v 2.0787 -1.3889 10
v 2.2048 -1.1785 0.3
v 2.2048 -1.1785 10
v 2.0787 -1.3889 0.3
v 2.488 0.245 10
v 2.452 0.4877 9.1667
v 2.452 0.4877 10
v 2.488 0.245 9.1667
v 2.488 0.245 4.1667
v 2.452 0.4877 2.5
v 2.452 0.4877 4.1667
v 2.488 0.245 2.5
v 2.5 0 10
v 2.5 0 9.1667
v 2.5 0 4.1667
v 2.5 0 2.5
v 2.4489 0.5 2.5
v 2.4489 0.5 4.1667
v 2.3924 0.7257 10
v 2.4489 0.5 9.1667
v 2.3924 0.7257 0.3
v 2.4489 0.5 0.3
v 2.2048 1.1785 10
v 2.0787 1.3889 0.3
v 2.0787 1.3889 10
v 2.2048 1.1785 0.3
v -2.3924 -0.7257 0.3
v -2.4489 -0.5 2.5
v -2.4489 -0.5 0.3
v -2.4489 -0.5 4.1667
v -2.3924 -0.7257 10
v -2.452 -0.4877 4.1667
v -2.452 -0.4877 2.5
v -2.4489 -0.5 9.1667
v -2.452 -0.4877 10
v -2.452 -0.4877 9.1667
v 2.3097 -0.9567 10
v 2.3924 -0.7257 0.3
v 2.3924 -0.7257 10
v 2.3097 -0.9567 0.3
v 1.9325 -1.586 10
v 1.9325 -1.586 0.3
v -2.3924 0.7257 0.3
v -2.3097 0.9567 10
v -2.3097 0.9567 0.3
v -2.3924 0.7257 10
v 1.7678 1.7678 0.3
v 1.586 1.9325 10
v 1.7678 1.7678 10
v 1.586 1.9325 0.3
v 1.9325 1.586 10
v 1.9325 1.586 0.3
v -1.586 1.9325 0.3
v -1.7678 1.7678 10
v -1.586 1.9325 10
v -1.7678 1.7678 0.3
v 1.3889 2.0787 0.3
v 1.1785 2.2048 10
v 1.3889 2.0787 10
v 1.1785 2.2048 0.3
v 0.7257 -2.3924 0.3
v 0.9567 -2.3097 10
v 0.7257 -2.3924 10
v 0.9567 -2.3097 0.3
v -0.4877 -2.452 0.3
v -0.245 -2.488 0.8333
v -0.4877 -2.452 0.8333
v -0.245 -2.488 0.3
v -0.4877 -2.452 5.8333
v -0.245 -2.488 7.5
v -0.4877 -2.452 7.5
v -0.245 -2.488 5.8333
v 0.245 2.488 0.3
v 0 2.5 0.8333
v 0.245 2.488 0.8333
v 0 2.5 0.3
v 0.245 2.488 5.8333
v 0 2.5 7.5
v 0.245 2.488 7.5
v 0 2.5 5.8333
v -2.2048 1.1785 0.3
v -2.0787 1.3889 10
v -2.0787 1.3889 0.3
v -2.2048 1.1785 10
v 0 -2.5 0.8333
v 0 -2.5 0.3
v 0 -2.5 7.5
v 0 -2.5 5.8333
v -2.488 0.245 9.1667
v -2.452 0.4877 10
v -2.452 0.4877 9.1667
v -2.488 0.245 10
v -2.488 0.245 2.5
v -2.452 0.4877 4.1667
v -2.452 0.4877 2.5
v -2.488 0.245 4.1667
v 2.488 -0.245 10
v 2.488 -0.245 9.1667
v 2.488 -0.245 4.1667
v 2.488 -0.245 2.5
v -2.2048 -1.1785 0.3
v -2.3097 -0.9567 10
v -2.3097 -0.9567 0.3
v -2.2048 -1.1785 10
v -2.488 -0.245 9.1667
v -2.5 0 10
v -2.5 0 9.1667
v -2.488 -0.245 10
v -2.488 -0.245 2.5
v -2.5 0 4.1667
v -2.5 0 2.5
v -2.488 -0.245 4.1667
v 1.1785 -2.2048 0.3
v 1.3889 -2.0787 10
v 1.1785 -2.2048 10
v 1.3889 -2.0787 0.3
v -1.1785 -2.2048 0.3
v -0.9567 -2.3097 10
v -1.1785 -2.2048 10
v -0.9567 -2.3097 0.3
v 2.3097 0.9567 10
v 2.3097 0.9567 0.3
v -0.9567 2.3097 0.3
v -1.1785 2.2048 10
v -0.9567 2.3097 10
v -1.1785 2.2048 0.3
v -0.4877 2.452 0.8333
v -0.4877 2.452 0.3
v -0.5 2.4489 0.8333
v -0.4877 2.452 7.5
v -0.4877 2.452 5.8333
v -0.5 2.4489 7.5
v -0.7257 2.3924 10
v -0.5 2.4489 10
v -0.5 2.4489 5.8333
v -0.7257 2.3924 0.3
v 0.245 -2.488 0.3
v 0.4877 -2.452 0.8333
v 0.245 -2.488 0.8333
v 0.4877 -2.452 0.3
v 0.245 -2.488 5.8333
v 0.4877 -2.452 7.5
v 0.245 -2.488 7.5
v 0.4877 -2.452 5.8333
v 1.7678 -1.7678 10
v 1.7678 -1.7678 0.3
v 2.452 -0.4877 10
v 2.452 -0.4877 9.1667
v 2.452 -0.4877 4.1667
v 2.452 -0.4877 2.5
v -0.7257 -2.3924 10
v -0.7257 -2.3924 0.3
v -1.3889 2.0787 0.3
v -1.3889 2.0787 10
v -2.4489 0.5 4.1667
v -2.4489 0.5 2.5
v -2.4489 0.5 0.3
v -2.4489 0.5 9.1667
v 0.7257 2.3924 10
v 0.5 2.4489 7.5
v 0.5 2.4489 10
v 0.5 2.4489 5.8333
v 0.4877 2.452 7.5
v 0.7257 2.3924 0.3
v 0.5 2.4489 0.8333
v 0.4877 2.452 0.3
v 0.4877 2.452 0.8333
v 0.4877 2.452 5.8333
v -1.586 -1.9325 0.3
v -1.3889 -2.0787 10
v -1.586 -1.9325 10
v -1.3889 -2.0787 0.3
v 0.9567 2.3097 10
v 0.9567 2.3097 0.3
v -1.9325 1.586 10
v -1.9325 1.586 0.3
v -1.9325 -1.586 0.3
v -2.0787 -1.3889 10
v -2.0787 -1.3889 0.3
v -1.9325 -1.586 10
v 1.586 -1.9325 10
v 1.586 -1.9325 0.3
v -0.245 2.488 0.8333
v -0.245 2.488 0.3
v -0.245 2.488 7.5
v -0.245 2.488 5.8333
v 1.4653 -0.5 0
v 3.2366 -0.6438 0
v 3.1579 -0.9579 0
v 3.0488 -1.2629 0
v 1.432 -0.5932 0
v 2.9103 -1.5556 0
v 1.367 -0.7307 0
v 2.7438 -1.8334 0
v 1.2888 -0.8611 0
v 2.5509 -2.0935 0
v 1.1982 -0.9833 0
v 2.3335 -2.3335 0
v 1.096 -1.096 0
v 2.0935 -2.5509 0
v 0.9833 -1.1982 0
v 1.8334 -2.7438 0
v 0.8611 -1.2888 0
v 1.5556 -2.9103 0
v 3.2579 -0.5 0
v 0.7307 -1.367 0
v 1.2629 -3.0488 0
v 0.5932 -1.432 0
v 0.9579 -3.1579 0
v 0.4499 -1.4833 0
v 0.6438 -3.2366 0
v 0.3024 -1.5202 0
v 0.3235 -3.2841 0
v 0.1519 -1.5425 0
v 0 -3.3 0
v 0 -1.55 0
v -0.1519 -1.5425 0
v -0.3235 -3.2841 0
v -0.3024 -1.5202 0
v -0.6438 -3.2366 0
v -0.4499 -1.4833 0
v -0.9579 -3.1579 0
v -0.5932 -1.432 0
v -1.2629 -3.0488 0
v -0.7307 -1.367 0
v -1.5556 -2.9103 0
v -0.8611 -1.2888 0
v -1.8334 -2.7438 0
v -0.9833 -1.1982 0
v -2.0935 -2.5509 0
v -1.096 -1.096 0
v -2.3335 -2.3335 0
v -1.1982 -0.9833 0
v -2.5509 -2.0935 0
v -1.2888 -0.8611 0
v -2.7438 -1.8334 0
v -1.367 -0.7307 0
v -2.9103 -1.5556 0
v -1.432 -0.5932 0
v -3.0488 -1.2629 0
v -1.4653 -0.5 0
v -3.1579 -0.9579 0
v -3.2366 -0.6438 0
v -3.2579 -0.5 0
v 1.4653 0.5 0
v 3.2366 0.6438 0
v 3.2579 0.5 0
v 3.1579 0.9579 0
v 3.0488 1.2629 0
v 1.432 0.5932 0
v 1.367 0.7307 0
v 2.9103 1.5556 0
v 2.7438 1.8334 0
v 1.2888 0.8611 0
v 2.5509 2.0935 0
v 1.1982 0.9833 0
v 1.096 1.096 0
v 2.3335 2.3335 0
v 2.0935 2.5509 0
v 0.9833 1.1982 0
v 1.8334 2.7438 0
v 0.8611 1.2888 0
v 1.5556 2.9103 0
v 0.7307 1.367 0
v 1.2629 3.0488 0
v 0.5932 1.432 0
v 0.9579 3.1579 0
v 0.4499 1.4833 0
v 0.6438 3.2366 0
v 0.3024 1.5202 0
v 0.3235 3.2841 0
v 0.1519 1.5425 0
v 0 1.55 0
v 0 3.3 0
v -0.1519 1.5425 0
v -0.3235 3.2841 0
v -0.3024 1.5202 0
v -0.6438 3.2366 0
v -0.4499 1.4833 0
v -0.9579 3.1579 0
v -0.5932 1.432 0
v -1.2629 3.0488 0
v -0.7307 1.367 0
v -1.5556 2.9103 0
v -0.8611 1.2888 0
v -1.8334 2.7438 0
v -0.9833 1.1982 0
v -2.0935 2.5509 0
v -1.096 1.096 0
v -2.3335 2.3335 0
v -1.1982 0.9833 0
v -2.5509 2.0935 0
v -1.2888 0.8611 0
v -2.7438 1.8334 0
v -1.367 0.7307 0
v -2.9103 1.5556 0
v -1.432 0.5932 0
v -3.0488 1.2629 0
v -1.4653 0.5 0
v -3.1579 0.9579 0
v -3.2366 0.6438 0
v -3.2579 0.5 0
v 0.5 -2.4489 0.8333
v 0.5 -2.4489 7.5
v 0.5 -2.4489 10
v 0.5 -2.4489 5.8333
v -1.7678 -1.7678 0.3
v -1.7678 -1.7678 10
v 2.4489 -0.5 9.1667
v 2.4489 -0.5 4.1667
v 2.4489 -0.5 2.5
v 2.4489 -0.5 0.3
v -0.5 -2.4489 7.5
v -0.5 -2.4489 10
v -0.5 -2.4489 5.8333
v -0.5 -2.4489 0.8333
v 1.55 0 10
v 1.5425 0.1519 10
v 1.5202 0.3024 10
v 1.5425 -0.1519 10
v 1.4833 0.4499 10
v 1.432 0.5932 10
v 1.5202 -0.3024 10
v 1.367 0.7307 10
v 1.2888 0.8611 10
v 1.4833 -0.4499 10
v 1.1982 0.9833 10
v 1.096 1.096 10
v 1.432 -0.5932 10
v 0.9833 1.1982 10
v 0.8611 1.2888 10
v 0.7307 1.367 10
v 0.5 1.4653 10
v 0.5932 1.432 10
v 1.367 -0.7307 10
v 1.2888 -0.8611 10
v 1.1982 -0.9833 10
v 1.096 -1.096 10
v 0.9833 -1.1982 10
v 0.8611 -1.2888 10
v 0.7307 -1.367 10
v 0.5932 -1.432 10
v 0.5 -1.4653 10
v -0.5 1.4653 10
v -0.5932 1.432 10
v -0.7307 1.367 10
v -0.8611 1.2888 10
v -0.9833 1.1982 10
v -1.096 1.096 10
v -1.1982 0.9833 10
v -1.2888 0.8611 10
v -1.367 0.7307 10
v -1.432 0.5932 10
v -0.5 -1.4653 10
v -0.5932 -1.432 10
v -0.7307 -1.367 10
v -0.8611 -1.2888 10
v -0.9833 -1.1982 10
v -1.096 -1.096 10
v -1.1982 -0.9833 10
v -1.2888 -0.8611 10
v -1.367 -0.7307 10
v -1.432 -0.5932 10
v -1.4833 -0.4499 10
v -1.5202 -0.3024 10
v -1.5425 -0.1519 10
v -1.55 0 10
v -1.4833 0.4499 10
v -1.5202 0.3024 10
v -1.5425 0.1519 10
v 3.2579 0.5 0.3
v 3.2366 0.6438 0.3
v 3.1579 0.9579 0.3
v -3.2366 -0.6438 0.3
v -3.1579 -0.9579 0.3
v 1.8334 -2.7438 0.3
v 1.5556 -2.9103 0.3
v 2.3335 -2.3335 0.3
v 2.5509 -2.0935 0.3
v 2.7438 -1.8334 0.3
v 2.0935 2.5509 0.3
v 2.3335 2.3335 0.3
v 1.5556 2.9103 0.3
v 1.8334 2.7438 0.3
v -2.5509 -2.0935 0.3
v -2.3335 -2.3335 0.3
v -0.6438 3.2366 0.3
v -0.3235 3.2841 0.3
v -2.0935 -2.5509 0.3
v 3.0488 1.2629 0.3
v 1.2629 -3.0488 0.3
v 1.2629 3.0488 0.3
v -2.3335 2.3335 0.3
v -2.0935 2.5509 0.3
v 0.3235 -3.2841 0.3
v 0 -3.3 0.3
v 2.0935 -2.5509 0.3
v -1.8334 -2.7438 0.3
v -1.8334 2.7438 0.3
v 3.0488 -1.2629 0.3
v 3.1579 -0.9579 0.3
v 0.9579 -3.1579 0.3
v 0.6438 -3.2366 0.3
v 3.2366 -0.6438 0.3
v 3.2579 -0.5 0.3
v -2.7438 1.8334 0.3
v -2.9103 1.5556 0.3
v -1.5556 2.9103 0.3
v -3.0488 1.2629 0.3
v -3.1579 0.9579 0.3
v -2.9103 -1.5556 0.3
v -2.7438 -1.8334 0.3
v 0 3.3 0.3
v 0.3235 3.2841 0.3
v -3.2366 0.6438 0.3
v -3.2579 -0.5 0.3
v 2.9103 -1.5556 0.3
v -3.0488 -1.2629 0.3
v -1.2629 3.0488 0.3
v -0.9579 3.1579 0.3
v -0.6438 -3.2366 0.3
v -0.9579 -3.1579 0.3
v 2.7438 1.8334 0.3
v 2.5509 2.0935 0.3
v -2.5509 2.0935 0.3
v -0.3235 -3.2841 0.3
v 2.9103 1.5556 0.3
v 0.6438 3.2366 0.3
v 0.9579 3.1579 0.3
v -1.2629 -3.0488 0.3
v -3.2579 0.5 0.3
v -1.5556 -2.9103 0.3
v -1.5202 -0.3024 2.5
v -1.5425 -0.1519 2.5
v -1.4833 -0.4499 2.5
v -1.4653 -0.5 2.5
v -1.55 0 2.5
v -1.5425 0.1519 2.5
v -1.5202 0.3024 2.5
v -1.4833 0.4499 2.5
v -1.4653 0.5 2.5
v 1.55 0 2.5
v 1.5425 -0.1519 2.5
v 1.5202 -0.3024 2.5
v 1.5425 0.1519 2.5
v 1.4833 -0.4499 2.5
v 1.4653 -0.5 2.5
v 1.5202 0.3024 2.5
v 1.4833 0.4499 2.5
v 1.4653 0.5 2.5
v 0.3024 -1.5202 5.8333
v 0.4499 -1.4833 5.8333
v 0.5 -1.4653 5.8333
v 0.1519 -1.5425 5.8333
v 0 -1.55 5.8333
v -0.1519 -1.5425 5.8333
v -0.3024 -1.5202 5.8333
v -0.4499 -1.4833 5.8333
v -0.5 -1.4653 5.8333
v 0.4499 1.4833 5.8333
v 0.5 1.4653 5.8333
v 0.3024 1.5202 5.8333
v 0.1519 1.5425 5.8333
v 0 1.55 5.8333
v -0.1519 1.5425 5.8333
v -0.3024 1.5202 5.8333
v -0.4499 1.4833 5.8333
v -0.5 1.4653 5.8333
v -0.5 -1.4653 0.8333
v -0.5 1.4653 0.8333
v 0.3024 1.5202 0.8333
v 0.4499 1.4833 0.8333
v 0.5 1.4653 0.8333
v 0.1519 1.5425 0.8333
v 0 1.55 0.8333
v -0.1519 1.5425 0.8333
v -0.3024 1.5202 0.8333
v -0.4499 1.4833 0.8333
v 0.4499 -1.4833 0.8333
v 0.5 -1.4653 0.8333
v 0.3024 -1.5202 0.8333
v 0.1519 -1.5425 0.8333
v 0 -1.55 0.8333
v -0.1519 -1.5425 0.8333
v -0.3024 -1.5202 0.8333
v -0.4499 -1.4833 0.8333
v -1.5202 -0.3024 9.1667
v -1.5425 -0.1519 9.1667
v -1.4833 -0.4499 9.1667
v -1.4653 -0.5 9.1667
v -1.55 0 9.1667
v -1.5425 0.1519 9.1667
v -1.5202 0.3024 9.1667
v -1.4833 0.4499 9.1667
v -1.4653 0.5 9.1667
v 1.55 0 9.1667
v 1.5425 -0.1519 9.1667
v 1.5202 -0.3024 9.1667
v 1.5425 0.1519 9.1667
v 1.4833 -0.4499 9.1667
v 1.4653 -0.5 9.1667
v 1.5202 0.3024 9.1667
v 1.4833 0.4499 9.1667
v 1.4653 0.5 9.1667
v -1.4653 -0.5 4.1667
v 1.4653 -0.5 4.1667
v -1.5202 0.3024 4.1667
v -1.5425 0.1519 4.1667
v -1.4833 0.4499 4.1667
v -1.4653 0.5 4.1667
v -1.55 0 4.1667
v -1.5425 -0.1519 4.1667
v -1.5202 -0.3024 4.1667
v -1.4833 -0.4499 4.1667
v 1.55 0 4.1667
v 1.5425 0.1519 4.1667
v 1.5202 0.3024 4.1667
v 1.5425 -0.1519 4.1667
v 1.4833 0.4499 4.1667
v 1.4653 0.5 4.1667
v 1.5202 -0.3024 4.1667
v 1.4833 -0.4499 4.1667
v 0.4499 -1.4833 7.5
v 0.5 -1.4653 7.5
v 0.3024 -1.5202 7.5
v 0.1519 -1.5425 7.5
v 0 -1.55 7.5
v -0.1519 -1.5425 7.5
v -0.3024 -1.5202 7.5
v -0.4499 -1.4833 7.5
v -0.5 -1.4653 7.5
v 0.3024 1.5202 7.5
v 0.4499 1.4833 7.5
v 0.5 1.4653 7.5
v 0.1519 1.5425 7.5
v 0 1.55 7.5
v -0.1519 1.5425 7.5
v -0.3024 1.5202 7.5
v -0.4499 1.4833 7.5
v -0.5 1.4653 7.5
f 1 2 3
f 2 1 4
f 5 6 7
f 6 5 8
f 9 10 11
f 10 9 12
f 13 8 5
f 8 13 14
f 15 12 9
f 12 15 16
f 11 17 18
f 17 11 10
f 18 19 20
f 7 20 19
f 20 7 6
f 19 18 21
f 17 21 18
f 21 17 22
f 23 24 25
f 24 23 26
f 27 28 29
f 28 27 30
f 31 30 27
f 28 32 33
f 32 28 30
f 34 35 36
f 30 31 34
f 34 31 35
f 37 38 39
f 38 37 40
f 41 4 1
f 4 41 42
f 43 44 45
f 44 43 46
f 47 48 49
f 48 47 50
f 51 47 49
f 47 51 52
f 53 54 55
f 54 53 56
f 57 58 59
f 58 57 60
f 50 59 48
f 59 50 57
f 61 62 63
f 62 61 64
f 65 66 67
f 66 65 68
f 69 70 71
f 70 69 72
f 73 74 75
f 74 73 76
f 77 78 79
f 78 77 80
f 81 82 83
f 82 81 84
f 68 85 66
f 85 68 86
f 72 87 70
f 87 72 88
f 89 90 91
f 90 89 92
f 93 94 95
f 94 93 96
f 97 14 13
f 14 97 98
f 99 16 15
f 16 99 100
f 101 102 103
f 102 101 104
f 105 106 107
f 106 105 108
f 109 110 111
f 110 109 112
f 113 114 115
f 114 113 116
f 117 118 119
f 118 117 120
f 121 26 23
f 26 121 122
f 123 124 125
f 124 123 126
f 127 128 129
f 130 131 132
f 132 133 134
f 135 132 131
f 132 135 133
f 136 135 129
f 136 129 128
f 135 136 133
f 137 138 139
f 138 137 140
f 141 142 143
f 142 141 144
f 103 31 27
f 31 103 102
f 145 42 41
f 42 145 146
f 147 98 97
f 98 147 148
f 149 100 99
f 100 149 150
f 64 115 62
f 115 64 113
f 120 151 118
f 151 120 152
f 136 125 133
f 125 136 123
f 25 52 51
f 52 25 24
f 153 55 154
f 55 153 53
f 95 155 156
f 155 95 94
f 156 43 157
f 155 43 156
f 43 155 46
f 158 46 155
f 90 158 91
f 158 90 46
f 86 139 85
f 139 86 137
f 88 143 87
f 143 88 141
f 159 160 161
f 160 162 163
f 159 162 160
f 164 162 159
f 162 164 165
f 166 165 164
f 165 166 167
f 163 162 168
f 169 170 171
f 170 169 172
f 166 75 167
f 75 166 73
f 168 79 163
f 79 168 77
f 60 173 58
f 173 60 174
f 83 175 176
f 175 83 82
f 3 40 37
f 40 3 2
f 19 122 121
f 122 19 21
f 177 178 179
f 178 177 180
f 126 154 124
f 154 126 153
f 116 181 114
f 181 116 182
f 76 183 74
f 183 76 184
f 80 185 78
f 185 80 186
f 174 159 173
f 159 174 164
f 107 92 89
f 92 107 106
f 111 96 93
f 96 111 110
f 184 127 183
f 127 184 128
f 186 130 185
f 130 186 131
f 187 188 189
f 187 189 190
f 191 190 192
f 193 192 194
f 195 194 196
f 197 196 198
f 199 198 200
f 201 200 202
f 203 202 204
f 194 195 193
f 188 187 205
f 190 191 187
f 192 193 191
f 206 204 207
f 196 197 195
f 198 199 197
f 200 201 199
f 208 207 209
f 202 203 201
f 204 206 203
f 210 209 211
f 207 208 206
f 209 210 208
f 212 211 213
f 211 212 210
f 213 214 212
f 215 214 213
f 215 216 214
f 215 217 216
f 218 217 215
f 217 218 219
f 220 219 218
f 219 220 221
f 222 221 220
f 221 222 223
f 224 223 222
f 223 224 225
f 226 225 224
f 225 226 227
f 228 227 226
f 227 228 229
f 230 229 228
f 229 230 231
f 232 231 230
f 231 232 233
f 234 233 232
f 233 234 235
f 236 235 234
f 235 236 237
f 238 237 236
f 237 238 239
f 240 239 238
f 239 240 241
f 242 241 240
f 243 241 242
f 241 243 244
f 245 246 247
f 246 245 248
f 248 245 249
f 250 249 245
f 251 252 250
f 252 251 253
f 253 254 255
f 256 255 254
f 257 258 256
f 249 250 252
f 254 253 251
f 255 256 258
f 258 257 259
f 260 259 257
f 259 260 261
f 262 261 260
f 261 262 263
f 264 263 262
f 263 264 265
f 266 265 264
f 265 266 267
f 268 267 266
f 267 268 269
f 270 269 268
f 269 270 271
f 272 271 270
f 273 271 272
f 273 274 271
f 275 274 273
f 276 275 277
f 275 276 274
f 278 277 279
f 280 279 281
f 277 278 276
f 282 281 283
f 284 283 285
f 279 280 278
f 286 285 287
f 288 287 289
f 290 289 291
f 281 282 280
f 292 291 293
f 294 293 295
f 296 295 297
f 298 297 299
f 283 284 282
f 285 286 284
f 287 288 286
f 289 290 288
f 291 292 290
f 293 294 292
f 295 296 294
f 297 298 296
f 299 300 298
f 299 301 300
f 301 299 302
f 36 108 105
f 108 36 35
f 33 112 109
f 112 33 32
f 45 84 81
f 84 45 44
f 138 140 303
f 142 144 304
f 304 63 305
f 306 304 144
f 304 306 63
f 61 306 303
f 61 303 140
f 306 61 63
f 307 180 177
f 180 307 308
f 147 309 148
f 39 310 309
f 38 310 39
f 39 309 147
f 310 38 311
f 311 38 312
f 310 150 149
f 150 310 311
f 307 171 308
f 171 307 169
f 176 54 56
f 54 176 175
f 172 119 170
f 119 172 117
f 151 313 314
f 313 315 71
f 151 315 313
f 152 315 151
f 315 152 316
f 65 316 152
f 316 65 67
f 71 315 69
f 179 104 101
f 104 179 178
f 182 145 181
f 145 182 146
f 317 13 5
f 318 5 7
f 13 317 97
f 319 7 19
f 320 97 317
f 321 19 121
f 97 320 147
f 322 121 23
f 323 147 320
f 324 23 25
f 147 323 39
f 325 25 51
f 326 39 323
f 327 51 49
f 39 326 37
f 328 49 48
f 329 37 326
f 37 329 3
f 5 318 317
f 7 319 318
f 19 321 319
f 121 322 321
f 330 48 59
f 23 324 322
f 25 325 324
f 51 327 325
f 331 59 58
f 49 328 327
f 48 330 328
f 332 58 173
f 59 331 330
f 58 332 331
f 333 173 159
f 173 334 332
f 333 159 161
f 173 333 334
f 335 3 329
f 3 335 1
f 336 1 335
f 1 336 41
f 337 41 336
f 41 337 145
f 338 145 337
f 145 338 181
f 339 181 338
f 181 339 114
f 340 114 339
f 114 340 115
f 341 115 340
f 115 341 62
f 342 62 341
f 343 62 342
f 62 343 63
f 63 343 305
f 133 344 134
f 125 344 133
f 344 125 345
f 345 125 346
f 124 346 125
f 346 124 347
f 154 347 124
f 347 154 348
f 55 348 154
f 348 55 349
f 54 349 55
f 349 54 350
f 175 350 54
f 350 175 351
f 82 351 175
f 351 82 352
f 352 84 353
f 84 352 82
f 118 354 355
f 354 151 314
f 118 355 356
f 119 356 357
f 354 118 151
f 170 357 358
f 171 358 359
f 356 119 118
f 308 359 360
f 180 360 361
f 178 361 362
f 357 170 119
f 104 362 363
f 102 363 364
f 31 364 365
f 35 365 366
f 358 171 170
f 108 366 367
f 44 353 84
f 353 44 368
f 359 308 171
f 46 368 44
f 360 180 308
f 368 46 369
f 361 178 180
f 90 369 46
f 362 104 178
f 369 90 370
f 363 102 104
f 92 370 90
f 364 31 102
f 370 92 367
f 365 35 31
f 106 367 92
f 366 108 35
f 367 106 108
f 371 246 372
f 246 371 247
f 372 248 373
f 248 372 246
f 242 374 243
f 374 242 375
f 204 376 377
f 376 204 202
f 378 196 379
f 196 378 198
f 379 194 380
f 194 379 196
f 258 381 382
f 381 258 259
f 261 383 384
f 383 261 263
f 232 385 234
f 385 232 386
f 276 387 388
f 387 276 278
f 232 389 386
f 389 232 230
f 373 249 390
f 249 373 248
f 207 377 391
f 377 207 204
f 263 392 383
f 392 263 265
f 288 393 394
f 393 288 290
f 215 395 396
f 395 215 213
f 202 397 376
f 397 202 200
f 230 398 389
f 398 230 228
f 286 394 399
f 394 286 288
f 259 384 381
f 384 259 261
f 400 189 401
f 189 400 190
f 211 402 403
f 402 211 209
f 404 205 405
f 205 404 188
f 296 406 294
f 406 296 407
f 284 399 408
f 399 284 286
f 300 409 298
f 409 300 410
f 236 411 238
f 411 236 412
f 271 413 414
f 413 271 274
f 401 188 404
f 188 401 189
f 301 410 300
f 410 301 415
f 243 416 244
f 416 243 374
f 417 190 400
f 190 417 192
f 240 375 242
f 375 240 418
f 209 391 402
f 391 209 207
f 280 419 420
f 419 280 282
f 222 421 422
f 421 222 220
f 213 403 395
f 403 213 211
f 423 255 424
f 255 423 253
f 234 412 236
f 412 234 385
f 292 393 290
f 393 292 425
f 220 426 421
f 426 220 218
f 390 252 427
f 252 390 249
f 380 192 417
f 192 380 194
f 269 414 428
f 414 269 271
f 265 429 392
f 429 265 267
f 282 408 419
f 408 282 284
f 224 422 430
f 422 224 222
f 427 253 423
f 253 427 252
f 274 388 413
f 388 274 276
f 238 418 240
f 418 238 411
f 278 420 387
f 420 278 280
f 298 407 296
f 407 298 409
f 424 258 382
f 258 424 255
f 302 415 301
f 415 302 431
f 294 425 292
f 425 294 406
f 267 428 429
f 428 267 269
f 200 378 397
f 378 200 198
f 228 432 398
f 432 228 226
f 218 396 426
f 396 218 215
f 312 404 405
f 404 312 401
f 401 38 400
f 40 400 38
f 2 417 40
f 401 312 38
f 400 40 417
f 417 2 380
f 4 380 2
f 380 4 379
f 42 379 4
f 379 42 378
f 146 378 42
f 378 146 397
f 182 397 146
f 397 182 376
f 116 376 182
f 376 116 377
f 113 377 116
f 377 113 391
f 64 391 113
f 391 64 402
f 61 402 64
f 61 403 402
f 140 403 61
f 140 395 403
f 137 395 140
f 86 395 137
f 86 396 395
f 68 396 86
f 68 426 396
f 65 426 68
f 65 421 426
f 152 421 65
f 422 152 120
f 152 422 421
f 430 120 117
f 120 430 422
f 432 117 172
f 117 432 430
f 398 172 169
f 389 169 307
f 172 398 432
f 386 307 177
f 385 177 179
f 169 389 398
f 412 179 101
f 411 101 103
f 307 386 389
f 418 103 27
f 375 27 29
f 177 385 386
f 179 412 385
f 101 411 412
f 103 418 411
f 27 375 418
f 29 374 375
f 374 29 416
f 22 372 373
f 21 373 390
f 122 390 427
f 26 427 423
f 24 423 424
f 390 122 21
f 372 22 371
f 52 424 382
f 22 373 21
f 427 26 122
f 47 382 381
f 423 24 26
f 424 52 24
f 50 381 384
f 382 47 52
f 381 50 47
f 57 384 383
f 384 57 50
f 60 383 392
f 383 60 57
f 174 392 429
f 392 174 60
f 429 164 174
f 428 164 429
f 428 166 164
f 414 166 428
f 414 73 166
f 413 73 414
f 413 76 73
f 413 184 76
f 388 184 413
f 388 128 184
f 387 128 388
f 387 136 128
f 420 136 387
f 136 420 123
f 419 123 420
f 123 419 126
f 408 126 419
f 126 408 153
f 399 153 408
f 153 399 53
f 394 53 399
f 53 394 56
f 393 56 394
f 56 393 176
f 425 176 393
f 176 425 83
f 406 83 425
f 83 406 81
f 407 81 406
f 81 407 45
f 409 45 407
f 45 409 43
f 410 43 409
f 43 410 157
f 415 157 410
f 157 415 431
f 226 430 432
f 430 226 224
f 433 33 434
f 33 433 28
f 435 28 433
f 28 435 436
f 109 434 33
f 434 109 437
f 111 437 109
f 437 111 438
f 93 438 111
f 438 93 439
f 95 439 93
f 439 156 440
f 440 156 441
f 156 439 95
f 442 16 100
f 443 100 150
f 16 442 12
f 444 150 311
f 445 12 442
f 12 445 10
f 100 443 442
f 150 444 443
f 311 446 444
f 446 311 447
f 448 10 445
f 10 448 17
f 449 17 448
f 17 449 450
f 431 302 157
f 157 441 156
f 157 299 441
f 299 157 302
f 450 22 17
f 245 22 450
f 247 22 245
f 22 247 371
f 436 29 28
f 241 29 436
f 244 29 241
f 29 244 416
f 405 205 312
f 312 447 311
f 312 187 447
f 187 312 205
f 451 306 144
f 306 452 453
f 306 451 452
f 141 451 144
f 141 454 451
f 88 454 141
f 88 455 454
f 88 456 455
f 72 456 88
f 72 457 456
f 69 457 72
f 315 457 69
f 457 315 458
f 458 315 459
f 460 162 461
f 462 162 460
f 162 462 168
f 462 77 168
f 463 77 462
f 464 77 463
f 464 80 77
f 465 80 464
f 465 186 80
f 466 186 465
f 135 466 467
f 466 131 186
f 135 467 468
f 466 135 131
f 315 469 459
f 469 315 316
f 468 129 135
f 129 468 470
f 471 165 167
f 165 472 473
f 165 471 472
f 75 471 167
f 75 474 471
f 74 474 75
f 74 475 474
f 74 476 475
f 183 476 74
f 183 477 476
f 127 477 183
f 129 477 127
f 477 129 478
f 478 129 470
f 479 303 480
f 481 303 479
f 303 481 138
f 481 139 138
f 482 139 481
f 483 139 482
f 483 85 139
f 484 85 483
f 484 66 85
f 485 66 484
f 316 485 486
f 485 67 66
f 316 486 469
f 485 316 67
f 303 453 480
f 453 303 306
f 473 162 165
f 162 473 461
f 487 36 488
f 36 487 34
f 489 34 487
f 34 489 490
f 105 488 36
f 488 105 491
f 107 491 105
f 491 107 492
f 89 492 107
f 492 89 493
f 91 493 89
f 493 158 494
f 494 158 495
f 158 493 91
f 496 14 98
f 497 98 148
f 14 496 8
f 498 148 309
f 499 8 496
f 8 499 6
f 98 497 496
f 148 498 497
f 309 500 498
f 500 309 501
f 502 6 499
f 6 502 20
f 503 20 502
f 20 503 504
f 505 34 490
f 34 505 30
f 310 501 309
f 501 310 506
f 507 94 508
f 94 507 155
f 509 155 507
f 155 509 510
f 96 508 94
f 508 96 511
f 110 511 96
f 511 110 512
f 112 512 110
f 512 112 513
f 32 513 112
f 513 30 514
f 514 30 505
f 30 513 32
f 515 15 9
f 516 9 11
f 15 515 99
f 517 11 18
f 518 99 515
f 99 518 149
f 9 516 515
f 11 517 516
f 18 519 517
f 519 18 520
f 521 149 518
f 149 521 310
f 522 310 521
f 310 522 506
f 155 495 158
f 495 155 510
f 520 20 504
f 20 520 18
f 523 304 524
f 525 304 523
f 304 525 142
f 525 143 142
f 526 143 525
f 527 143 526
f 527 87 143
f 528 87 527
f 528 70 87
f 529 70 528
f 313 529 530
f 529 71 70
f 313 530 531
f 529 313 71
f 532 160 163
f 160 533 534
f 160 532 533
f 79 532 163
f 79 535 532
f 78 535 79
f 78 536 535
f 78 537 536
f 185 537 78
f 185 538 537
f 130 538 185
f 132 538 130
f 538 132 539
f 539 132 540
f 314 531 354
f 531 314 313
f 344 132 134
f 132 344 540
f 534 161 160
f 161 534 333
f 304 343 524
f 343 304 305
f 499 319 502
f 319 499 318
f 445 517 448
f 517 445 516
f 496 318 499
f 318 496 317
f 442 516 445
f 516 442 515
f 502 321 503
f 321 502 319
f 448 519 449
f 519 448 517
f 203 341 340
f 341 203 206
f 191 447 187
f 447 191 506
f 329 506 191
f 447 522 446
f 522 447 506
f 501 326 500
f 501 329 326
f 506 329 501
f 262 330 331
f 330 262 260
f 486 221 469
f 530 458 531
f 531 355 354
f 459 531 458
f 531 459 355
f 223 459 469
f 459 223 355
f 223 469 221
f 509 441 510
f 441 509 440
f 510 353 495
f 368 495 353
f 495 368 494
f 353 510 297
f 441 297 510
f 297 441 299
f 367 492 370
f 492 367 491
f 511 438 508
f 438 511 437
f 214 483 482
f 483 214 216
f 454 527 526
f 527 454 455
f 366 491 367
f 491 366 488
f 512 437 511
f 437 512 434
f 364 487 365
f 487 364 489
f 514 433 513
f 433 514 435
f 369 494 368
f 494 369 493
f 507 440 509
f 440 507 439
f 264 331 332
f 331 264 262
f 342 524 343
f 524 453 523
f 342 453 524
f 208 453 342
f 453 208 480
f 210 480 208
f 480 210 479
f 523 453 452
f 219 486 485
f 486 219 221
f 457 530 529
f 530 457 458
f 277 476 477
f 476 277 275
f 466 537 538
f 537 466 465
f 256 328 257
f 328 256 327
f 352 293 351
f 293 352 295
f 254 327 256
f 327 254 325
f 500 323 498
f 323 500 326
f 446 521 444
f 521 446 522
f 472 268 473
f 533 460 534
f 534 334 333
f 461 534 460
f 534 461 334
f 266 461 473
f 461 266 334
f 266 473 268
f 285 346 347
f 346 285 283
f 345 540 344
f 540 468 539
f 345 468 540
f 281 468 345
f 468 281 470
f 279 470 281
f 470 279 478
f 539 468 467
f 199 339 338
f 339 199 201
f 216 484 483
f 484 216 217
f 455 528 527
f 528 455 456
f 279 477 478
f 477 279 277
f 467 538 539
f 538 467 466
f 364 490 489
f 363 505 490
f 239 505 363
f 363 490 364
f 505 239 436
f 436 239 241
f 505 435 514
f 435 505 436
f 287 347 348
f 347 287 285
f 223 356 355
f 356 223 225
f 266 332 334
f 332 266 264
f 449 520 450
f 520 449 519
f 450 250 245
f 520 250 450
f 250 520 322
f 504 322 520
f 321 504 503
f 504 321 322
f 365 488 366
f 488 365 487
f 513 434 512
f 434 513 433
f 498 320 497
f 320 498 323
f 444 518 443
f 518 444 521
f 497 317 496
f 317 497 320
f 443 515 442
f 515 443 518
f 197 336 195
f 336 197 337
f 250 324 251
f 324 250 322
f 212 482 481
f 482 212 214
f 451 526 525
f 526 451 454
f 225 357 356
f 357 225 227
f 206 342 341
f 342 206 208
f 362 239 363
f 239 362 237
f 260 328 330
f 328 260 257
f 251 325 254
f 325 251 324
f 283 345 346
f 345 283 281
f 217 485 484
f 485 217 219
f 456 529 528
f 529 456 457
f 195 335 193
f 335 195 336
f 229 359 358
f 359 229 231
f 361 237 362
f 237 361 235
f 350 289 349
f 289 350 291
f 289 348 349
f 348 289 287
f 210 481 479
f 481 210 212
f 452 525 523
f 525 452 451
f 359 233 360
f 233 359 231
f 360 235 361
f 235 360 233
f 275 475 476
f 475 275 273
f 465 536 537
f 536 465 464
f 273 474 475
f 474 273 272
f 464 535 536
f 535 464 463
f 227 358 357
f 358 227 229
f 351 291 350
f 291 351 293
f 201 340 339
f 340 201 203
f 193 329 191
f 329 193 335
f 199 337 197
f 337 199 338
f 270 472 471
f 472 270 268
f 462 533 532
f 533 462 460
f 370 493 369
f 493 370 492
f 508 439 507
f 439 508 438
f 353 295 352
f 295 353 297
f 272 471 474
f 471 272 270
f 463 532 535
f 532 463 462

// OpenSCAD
$fn=64;
delta=.0;
h=10;
collar_r=.8;
collar_h=.3;

module m(d1=4.4,d2=3.1){
    difference() {
        union() {
            cylinder(d=d1-delta,h=h);
            cylinder(d=d1+collar_r*2,h=collar_h);
        }
        cylinder(d=d2+delta,h=3*h,center=true);
        
        for(i=[0:3])
        translate([0,0,i*h/3])
        rotate(90*i)
        cube([10,1,h/2],center=true);
    }
}

mode="m36";
if(mode=="m44") {
    m(4.6);
}

if(mode=="m36") {
    m(5);
}
